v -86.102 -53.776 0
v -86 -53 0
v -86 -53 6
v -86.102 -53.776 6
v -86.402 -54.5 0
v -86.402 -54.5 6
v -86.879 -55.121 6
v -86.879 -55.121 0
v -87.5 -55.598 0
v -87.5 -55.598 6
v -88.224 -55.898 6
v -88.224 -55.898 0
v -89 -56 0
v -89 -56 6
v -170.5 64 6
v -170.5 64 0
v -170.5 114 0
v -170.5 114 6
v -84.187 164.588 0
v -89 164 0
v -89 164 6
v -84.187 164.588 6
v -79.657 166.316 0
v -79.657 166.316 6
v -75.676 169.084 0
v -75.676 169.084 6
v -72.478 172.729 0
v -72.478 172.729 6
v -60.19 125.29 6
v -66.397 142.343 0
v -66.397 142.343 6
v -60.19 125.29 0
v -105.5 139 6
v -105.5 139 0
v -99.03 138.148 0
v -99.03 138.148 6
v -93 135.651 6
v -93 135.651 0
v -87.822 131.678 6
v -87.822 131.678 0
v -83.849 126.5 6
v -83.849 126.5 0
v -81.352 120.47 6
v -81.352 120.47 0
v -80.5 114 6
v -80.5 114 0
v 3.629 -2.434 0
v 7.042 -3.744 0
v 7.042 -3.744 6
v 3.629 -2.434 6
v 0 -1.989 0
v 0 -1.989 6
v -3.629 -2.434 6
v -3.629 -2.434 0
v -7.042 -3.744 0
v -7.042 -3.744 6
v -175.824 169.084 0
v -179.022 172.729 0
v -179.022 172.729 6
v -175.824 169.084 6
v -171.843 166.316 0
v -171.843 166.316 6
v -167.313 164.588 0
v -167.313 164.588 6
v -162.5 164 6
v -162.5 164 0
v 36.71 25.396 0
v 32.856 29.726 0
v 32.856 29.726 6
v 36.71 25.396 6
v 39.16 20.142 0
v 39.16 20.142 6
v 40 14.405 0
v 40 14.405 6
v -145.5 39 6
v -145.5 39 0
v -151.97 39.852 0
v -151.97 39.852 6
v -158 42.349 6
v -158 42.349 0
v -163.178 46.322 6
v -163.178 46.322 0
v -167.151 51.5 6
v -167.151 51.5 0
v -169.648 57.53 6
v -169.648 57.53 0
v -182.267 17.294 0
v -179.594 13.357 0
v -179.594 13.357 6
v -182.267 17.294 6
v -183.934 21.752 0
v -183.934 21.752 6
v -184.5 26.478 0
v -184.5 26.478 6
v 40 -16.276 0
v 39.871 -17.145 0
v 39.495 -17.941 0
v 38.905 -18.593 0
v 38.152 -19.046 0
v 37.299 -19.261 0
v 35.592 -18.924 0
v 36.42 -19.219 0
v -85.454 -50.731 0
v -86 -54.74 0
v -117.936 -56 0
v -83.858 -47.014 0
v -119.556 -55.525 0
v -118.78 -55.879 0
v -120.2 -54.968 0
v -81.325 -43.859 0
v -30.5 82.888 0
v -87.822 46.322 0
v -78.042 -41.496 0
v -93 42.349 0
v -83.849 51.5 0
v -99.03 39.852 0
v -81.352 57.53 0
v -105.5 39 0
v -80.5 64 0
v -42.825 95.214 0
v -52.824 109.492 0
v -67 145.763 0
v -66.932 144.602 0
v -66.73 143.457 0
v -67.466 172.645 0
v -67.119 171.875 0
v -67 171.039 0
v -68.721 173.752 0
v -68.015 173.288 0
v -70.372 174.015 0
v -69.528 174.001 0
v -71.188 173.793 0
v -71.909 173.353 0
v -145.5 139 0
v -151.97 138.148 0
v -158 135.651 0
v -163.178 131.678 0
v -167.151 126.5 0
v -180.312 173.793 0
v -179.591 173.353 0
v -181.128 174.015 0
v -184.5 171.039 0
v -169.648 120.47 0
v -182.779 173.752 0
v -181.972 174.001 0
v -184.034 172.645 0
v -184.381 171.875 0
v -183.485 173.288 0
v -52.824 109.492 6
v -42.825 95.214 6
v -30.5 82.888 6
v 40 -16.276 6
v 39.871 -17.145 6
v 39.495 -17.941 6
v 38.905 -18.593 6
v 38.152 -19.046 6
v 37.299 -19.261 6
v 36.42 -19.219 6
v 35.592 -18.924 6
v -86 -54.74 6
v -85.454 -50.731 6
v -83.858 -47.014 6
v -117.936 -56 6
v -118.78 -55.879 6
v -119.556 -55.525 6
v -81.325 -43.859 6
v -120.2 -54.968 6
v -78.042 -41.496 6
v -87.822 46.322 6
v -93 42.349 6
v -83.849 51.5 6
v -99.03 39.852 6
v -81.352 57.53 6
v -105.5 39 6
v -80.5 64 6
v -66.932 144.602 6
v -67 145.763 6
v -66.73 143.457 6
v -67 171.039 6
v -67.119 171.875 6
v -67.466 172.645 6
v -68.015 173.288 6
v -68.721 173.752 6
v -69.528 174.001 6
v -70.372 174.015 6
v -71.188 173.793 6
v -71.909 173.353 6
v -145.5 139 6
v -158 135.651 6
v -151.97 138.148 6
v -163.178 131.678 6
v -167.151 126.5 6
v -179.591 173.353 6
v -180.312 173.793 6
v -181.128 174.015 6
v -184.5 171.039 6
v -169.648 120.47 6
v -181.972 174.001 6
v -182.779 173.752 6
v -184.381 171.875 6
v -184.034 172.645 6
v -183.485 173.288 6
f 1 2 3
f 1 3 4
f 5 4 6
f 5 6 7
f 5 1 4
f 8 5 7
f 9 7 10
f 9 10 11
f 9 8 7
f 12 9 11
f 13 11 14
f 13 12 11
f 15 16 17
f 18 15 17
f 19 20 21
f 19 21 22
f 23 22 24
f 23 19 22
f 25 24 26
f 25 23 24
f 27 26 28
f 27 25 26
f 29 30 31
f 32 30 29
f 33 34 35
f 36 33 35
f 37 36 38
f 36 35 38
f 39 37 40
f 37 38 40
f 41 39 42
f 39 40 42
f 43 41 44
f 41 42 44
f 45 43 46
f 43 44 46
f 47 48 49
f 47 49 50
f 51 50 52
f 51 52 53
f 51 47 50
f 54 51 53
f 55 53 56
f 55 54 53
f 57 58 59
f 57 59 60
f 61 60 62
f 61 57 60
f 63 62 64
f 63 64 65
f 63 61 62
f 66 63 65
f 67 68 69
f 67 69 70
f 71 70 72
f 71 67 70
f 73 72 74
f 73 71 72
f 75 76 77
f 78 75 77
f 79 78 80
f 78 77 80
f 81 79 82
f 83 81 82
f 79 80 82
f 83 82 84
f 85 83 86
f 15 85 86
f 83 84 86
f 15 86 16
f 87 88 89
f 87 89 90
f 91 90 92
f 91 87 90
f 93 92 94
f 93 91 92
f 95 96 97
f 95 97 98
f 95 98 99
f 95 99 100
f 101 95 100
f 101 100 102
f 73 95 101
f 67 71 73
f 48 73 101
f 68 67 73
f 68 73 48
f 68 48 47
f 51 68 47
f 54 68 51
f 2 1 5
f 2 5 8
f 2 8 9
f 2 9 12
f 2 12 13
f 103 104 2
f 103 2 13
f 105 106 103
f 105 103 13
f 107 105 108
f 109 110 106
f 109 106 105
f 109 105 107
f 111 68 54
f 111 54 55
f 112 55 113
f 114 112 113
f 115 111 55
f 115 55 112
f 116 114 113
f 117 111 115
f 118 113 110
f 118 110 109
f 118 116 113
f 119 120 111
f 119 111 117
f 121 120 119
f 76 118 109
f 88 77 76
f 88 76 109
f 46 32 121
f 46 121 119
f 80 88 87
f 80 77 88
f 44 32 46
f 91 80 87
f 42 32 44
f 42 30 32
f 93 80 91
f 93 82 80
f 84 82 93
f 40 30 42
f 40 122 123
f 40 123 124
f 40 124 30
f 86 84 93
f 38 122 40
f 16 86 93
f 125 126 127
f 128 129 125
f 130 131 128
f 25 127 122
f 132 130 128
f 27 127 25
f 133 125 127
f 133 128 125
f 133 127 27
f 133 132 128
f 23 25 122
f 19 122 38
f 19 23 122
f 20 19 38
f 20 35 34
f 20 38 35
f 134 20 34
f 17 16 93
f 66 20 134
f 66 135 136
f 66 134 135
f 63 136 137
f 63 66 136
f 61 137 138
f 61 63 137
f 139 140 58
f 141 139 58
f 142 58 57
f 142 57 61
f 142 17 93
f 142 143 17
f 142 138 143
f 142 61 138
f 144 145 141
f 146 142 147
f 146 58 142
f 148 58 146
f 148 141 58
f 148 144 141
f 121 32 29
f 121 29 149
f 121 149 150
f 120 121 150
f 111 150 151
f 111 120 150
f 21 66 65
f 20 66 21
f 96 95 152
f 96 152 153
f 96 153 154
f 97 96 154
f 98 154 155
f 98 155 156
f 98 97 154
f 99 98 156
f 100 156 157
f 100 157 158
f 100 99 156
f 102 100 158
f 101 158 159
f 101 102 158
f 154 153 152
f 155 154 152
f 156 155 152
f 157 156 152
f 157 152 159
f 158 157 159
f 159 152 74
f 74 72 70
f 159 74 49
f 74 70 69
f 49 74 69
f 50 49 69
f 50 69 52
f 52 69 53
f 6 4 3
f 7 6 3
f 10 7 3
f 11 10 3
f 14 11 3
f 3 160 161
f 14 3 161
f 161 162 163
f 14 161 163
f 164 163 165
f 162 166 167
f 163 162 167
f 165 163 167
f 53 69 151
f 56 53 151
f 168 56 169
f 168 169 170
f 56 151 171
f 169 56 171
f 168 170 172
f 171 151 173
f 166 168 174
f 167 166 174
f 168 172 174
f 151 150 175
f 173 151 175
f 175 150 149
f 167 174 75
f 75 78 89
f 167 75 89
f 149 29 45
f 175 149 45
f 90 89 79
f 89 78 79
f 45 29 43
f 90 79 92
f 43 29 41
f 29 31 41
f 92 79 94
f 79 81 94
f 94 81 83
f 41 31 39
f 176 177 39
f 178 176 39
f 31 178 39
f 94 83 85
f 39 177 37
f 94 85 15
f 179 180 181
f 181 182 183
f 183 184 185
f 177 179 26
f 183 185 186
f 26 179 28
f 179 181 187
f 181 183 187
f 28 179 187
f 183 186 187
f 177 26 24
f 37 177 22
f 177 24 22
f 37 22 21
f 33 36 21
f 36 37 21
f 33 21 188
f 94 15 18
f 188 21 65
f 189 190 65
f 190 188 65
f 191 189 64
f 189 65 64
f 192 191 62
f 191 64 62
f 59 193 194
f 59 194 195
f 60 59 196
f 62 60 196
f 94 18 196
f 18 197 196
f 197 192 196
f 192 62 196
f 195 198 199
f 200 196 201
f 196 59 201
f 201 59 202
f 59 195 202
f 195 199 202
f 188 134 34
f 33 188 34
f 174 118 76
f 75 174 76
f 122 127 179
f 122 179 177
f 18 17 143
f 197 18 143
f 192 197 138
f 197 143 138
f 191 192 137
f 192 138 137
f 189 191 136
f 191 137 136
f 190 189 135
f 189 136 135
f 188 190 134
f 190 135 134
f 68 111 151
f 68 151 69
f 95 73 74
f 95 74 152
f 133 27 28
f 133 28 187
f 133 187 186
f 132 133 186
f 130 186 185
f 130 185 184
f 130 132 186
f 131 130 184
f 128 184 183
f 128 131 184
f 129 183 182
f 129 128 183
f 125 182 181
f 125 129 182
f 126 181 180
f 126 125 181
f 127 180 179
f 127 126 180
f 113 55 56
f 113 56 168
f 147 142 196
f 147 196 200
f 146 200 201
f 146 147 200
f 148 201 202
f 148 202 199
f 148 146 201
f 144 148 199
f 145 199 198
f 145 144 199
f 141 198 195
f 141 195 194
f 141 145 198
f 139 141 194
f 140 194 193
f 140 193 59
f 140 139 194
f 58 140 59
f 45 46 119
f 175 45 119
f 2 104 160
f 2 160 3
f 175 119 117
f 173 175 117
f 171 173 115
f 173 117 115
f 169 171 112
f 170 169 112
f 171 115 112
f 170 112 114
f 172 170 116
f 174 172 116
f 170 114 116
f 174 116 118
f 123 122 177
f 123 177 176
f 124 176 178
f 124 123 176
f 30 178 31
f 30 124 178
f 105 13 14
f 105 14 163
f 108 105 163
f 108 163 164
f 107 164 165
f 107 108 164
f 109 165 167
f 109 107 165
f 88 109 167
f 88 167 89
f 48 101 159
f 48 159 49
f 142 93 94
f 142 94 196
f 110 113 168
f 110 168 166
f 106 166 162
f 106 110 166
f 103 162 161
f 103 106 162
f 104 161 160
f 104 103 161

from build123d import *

# Parameters (mm, degrees)
EXTRUDE1_DEPTH = 6


with BuildPart() as part:
    # Sketch1 → Extrude1 (new body)
    with BuildSketch(Plane.XY):
        with BuildLine():
            Line((-7.042073442, -3.744336867), (-78.042073442, -41.495706515))
            ThreePointArc((-78.042073442, -41.495706515), (-83.857509511, -47.014349285), (-86, -54.739920408))
            Line((-86, -54.739920408), (-86, -53))
            ThreePointArc((-86, -53), (-86.878679656, -55.121320344), (-89, -56))
            Line((-89, -56), (-117.936315897, -56))
            ThreePointArc((-117.936315897, -56), (-119.180395625, -55.729883813), (-120.200444638, -54.968177087))
            Line((-120.200444638, -54.968177087), (-179.594191604, 13.35651301))
            ThreePointArc((-179.594191604, 13.35651301), (-183.233443785, 19.473545965), (-184.5, 26.47769359))
            Line((-184.5, 26.47769359), (-184.5, 171.038518603))
            ThreePointArc((-184.5, 171.038518603), (-182.384651737, 173.905117861), (-179.02173913, 172.729146611))
            ThreePointArc((-179.02173913, 172.729146611), (-171.842990213, 166.316433225), (-162.5, 164))
            Line((-162.5, 164), (-89, 164))
            ThreePointArc((-89, 164), (-79.657009787, 166.316433225), (-72.47826087, 172.729146611))
            ThreePointArc((-72.47826087, 172.729146611), (-69.115348263, 173.905117861), (-67, 171.038518603))
            Line((-67, 171.038518603), (-67, 145.763269807))
            ThreePointArc((-67, 145.763269807), (-66.84807753, 144.02678803), (-66.396926208, 142.343068374))
            Line((-66.396926208, 142.343068374), (-60.19025019, 125.290366164))
            ThreePointArc((-60.19025019, 125.290366164), (-48.13619254, 102.134736861), (-30.49974908, 82.887936184))
            Line((-30.49974908, 82.887936184), (32.855752194, 29.726358433))
            ThreePointArc((32.855752194, 29.726358433), (38.126155741, 22.857834805), (40, 14.40546957))
            Line((40, 14.40546957), (40, -16.275538819))
            ThreePointArc((40, -16.275538819), (38.545114225, -18.847040722), (35.591585312, -18.924381598))
            Line((35.591585312, -18.924381598), (7.042073442, -3.744336867))
            ThreePointArc((7.042073442, -3.744336867), (0, -1.98855076), (-7.042073442, -3.744336867))
        make_face()
        with BuildLine():
            Line((-145.5, 139), (-105.5, 139))
            ThreePointArc((-105.5, 139), (-87.82233047, 131.67766953), (-80.5, 114))
            Line((-80.5, 114), (-80.5, 64))
            ThreePointArc((-80.5, 64), (-87.82233047, 46.32233047), (-105.5, 39))
            Line((-105.5, 39), (-145.5, 39))
            ThreePointArc((-145.5, 39), (-163.17766953, 46.32233047), (-170.5, 64))
            Line((-170.5, 64), (-170.5, 114))
            ThreePointArc((-170.5, 114), (-163.17766953, 131.67766953), (-145.5, 139))
        make_face(mode=Mode.SUBTRACT)
    extrude(amount=EXTRUDE1_DEPTH)


solid = part.part
